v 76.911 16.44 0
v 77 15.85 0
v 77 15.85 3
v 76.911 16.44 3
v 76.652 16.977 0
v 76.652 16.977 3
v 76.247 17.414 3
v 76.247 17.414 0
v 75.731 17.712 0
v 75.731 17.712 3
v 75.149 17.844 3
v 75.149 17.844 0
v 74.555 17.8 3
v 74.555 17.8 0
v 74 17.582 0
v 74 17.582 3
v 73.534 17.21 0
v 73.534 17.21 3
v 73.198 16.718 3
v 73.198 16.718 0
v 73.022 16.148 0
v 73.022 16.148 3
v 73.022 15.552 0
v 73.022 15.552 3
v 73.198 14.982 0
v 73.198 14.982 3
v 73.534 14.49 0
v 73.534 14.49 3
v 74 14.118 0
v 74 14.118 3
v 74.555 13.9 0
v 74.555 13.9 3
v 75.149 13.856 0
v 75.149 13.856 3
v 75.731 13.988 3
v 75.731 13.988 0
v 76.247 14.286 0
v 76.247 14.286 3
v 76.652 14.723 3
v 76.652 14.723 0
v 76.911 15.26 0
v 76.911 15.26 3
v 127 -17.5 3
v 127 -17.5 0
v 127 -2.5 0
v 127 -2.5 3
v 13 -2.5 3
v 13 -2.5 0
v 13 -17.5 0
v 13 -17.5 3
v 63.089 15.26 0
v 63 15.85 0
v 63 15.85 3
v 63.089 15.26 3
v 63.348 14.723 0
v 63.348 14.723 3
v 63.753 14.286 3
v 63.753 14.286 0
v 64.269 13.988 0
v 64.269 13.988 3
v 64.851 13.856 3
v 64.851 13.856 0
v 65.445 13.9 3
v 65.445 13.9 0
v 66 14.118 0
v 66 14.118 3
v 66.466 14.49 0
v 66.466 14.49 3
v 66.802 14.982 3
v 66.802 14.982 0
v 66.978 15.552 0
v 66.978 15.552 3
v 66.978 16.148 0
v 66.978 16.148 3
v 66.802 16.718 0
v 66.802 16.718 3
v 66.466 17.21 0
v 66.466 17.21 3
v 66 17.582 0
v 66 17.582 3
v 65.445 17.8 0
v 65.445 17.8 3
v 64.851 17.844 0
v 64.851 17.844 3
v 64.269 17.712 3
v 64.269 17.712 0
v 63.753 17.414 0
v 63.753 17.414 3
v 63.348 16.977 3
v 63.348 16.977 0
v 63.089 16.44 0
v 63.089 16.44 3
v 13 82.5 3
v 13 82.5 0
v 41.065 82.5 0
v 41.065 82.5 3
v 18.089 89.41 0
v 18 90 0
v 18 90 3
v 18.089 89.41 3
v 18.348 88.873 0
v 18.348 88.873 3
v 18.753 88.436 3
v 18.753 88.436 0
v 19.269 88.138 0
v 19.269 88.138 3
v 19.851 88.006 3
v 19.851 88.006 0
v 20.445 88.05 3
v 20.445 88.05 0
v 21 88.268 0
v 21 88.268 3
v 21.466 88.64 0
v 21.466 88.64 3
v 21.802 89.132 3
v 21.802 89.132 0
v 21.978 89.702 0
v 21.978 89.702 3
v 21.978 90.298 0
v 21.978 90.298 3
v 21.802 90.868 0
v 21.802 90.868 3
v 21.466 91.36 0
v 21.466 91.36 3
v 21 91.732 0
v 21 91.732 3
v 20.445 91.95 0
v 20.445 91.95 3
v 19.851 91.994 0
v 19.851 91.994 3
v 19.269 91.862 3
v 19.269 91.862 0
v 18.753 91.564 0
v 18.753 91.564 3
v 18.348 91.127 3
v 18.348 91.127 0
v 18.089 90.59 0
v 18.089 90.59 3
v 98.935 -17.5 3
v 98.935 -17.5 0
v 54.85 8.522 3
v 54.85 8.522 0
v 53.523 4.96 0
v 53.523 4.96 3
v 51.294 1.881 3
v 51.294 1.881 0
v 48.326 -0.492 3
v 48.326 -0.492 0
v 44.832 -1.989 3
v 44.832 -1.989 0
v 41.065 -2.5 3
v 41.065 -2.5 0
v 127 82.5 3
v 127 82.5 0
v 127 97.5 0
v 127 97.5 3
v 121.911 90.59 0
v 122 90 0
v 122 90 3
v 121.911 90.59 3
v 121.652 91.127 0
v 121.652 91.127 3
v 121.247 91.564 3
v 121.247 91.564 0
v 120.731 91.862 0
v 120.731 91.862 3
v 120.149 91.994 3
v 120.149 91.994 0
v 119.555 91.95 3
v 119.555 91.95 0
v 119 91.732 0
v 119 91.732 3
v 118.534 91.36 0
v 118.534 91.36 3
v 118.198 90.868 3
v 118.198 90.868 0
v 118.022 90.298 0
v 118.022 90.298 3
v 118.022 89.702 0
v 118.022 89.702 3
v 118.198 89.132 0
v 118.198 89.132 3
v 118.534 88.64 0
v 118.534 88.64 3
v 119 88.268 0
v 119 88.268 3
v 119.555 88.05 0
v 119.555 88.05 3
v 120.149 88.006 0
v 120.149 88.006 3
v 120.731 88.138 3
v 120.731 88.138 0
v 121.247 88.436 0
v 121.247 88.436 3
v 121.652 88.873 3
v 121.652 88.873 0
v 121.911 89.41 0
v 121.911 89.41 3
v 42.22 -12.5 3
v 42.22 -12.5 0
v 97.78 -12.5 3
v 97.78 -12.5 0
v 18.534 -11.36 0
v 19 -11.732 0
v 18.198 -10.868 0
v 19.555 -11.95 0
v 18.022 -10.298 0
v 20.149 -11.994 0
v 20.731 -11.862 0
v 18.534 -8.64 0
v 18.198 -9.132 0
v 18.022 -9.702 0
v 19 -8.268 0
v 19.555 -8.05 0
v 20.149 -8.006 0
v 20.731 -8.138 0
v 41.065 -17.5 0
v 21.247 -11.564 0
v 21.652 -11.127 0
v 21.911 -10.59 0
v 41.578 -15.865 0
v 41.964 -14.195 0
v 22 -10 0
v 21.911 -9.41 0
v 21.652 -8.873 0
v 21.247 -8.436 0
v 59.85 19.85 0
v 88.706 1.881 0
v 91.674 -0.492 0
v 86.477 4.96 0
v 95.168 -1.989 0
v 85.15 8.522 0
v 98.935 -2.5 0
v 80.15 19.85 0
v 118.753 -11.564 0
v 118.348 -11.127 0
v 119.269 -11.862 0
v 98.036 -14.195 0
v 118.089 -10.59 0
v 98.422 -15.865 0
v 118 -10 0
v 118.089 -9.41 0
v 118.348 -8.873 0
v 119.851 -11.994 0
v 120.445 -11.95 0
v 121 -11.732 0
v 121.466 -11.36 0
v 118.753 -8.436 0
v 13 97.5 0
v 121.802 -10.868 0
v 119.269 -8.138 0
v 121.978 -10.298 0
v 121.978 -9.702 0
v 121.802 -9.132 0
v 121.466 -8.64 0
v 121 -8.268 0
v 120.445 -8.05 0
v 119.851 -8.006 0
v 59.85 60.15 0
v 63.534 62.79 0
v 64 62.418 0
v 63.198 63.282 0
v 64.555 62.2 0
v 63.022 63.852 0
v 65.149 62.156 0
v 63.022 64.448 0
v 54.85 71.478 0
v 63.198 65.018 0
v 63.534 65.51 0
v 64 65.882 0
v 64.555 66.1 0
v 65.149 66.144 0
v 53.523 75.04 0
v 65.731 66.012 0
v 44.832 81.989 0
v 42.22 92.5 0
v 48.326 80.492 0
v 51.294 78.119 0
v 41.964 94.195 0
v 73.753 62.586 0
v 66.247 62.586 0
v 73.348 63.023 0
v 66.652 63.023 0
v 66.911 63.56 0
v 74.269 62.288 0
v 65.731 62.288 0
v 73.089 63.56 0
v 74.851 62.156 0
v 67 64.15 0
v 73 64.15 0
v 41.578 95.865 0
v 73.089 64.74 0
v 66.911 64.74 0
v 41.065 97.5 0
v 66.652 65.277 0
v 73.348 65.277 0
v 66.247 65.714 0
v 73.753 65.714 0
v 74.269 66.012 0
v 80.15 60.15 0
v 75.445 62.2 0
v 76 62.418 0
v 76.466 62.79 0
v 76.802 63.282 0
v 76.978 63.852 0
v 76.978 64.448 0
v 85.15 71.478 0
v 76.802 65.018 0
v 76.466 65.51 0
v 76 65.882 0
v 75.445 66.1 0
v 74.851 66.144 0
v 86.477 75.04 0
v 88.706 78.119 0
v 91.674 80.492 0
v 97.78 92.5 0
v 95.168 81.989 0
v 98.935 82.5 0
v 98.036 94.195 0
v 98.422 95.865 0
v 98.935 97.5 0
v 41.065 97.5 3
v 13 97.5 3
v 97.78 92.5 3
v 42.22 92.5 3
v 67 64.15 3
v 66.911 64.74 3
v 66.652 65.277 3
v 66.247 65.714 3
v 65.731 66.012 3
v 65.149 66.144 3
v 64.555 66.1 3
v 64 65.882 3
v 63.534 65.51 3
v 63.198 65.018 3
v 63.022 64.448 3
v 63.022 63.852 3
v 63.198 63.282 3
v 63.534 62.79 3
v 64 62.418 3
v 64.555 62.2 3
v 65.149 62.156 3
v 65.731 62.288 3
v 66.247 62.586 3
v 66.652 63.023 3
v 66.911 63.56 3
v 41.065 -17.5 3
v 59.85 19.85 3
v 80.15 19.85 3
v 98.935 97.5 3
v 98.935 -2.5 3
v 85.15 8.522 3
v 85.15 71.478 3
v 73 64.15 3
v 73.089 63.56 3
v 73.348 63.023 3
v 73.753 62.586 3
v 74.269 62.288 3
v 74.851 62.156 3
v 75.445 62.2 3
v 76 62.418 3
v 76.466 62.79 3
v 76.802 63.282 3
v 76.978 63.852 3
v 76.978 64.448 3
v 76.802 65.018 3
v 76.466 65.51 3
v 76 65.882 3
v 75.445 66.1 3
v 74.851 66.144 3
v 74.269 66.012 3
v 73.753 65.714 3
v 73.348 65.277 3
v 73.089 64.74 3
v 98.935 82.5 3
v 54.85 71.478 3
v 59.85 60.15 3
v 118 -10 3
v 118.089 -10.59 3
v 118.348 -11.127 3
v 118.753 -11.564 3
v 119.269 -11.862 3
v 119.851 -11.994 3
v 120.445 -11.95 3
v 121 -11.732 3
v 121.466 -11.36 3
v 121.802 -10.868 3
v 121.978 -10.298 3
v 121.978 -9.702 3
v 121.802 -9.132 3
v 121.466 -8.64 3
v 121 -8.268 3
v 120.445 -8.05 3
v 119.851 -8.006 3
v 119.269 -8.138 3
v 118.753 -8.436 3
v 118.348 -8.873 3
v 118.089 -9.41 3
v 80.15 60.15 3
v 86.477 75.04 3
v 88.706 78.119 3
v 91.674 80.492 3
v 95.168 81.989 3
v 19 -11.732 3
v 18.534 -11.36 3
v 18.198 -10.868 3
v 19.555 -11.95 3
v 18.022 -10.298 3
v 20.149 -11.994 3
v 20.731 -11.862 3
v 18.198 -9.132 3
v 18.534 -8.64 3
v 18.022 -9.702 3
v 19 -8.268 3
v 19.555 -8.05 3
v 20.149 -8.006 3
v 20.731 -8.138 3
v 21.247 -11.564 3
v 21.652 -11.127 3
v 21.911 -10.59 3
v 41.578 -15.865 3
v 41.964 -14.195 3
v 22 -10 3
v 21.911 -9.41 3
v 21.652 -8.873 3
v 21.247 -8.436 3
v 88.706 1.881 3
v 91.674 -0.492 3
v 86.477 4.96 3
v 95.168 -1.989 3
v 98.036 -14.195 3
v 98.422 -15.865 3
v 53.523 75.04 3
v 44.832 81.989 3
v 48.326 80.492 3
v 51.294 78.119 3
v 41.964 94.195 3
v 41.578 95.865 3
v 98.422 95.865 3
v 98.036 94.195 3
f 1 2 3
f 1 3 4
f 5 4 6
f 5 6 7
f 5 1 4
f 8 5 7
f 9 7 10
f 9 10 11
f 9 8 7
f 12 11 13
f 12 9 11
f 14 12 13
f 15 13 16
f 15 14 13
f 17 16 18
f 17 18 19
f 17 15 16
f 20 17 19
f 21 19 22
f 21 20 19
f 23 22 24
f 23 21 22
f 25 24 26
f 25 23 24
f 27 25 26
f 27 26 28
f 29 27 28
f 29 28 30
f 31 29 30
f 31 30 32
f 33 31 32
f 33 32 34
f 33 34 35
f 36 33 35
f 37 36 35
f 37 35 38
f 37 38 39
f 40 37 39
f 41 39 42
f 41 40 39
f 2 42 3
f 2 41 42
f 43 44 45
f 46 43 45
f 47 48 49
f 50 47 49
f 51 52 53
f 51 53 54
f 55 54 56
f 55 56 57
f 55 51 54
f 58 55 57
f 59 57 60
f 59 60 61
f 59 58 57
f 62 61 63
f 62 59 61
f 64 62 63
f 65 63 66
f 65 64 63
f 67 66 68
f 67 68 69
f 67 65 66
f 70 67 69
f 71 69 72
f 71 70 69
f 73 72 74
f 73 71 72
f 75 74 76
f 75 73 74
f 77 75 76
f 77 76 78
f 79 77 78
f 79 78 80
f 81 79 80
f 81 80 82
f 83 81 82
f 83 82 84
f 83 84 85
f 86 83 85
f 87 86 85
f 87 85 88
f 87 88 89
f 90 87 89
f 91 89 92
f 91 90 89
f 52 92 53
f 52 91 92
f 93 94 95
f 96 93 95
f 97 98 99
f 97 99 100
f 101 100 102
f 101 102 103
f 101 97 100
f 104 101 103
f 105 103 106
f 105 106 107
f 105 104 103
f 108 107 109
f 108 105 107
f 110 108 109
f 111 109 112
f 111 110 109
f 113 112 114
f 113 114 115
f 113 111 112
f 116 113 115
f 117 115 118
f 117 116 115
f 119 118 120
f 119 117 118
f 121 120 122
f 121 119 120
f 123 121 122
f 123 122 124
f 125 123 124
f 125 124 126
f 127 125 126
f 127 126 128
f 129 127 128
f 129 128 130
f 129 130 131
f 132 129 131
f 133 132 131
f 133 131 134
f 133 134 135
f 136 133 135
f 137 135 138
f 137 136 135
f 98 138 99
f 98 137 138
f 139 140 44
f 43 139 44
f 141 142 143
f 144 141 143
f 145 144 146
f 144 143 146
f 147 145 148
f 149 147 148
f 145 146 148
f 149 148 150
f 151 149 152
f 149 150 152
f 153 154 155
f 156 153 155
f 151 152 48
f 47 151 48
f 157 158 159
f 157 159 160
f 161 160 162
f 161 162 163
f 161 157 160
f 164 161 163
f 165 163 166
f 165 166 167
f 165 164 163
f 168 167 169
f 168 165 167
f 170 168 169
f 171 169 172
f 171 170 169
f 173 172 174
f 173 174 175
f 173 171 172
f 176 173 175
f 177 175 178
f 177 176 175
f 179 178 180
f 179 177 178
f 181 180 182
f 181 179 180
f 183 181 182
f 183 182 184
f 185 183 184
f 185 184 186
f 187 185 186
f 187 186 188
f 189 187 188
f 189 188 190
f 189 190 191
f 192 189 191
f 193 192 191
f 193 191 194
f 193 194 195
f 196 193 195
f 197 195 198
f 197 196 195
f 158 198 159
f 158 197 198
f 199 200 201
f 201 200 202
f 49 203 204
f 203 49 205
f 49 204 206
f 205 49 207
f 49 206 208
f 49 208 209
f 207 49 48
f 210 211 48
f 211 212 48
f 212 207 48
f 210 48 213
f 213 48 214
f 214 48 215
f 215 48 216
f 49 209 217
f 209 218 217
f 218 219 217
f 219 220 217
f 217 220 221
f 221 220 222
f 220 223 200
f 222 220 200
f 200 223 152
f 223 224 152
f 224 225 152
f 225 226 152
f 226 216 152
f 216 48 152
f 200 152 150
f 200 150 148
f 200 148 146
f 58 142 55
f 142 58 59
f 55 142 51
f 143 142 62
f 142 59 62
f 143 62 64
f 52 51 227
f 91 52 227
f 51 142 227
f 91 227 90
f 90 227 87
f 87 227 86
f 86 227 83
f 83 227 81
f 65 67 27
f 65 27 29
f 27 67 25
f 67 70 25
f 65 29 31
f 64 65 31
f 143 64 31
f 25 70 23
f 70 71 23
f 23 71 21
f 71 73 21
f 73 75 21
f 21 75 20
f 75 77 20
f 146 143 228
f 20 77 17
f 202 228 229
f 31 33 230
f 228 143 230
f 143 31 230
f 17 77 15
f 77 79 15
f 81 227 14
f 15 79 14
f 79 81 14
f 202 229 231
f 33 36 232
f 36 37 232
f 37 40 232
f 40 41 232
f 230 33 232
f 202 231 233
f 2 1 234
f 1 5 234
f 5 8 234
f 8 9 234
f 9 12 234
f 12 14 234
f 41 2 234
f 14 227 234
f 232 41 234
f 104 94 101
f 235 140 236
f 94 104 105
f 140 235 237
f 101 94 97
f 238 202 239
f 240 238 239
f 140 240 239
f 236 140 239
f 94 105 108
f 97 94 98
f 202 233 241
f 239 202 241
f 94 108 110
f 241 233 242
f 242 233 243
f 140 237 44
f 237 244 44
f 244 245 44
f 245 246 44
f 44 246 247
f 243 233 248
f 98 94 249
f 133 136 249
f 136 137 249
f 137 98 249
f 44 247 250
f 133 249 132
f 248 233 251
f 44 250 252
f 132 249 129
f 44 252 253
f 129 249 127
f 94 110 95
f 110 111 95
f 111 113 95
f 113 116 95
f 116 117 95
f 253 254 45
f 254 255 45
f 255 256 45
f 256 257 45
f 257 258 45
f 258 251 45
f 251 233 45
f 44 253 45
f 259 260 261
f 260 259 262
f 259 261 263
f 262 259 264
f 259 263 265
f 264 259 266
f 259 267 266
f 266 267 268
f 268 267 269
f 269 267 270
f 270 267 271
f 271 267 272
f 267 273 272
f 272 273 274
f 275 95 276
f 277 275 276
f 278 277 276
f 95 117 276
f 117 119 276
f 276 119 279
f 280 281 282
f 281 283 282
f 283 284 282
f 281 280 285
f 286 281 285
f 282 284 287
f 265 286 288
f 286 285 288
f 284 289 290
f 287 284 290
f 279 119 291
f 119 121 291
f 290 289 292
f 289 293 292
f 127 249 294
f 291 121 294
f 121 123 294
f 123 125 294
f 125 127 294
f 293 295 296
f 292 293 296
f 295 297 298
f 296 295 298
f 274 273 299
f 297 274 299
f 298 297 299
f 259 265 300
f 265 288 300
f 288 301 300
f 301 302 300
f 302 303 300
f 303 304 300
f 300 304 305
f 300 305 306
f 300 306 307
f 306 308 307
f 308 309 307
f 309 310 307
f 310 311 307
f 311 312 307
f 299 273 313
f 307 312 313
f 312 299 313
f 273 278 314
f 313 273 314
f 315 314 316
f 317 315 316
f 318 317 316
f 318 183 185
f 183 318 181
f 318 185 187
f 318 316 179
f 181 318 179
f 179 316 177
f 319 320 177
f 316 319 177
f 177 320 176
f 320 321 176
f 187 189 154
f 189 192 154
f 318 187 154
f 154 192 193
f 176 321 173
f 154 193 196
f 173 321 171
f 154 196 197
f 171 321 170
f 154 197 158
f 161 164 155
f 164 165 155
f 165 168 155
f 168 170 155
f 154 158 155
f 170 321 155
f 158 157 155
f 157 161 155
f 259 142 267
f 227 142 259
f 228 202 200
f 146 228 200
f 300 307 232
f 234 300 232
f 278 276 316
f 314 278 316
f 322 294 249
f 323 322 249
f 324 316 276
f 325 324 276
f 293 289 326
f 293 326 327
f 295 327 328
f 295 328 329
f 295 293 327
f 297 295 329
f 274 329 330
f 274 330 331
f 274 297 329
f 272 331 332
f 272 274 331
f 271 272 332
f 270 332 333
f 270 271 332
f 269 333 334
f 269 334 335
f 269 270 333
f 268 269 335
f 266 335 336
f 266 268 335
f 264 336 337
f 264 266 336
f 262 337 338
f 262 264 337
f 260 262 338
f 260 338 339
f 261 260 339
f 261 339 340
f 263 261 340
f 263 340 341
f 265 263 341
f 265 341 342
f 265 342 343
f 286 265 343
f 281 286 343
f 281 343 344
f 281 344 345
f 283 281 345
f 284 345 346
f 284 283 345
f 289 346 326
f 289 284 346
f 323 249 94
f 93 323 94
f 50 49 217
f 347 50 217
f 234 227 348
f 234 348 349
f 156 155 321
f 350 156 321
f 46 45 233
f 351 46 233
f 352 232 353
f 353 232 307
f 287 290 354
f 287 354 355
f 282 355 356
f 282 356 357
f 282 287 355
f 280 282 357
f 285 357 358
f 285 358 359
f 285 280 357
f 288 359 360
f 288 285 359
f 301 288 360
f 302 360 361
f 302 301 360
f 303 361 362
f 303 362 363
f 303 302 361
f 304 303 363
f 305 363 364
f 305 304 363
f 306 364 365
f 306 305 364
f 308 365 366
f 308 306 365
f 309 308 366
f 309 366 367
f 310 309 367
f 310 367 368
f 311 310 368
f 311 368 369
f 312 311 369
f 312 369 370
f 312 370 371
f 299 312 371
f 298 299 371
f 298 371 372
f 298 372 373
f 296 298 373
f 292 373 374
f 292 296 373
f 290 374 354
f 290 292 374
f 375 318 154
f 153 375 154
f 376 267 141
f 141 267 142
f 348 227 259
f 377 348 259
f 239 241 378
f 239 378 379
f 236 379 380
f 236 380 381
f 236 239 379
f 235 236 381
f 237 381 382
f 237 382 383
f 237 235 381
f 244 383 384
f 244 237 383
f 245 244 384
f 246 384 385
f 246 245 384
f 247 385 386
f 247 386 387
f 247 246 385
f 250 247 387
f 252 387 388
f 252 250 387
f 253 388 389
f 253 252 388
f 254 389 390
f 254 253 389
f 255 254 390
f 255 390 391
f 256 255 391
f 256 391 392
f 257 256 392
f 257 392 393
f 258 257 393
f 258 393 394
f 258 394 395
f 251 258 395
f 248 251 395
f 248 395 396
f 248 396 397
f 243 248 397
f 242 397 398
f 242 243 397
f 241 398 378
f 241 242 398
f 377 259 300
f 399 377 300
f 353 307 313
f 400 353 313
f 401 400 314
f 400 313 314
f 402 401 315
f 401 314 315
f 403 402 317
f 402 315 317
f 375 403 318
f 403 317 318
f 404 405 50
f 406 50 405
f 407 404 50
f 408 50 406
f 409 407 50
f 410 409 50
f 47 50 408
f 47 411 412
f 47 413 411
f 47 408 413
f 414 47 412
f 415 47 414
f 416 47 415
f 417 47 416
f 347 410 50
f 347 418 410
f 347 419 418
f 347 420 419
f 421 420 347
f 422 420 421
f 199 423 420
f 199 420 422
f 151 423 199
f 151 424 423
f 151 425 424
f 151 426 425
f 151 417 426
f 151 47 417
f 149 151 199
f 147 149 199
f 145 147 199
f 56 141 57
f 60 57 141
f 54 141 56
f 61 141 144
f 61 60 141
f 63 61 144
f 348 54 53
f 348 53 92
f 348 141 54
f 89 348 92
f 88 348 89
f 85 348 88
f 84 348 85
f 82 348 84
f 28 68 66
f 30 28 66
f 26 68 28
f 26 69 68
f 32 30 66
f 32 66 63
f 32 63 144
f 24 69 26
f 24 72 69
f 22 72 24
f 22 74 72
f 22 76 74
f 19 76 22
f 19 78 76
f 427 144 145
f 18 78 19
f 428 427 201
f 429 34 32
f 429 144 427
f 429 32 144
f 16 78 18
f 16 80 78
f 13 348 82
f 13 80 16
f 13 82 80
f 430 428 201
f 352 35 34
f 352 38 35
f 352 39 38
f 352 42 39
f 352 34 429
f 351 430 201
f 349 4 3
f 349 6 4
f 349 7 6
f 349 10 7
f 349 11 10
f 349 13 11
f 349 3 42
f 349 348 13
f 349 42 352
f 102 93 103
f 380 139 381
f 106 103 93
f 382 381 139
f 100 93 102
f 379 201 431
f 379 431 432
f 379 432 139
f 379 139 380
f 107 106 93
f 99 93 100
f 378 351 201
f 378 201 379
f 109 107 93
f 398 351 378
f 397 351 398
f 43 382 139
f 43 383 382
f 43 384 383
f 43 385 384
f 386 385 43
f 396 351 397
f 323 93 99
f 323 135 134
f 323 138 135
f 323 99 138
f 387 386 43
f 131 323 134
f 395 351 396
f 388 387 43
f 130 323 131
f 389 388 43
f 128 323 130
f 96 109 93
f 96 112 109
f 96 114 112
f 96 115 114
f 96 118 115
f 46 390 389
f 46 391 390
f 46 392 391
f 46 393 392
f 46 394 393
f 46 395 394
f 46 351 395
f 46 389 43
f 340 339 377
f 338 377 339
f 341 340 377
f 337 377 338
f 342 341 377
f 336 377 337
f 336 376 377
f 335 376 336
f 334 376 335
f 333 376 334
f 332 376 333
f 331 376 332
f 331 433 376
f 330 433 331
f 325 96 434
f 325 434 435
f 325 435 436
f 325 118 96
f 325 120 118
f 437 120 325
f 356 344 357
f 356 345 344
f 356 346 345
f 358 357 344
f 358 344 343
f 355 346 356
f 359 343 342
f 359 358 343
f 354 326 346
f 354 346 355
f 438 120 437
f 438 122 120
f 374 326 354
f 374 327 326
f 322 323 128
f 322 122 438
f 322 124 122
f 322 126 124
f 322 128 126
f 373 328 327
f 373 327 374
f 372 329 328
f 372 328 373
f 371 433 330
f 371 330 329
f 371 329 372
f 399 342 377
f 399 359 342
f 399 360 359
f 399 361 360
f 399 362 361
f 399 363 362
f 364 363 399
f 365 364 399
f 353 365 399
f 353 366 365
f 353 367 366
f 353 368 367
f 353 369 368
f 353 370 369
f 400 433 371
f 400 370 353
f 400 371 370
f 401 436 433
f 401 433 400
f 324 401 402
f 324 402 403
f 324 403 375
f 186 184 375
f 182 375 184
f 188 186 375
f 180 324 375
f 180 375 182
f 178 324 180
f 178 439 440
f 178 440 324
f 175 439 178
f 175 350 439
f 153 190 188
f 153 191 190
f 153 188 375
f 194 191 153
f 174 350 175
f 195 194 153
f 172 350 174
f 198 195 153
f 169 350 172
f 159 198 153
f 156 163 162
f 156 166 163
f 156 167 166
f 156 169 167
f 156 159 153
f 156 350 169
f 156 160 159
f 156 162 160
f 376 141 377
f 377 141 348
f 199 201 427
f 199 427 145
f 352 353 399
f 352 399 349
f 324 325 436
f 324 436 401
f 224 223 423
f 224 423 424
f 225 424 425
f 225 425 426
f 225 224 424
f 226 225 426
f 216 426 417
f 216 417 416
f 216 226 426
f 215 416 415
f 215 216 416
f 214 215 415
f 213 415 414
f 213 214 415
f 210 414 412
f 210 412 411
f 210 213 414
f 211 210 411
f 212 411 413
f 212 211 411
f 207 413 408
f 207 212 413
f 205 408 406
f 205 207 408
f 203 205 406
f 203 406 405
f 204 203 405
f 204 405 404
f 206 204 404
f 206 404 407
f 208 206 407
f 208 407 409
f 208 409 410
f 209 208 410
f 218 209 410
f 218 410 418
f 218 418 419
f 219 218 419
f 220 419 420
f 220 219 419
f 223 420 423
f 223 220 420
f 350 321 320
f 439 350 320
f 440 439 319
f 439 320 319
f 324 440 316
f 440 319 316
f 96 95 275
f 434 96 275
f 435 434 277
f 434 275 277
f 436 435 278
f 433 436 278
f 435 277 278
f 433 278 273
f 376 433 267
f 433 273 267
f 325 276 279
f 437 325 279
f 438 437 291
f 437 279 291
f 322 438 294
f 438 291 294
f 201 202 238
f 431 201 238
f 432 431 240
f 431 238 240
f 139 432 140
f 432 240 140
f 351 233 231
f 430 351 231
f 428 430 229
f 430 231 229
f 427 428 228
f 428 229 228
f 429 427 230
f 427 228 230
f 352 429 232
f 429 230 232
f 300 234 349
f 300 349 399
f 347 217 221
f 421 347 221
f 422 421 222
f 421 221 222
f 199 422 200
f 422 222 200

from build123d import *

# Parameters (mm, degrees)
CROQUIS2_R              = 2
CROQUIS2_W              = 20.3
CROQUIS2_H              = 40.3
SALIENTE_EXTRUIR2_DEPTH = 3


with BuildPart() as part:
    # Croquis2 → Saliente-Extruir2 (new body)
    with BuildSketch(Plane.XY):
        with BuildLine():
            Line((54.85, 71.478027684), (54.85, 8.521972316))
            ThreePointArc((54.85, 8.521972316), (49.890052554, 0.594274169), (41.065374433, -2.5))
            Line((41.065374433, -2.5), (13, -2.5))
            Line((13, -2.5), (13, -17.5))
            Line((13, -17.5), (41.065374433, -17.5))
            ThreePointArc((41.065374433, -17.5), (41.786840737, -15.033246538), (42.220486043, -12.5))
            Line((42.220486043, -12.5), (67.5, -12.5))
            Line((67.5, -12.5), (72.5, -12.5))
            Line((72.5, -12.5), (97.779513957, -12.5))
            ThreePointArc((97.779513957, -12.5), (98.213159263, -15.033246538), (98.934625567, -17.5))
            Line((98.934625567, -17.5), (127, -17.5))
            Line((127, -17.5), (127, -2.5))
            Line((127, -2.5), (98.934625567, -2.5))
            ThreePointArc((98.934625567, -2.5), (90.109947446, 0.594274169), (85.15, 8.521972316))
            Line((85.15, 8.521972316), (85.15, 71.478027684))
            ThreePointArc((85.15, 71.478027684), (90.109947446, 79.405725831), (98.934625567, 82.5))
            Line((98.934625567, 82.5), (127, 82.5))
            Line((127, 82.5), (127, 97.5))
            Line((127, 97.5), (98.934625567, 97.5))
            ThreePointArc((98.934625567, 97.5), (98.213159263, 95.033246538), (97.779513957, 92.5))
            Line((97.779513957, 92.5), (72.5, 92.5))
            Line((72.5, 92.5), (67.5, 92.5))
            Line((67.5, 92.5), (42.220486043, 92.5))
            ThreePointArc((42.220486043, 92.5), (41.786840737, 95.033246538), (41.065374433, 97.5))
            Line((41.065374433, 97.5), (13, 97.5))
            Line((13, 97.5), (13, 82.5))
            Line((13, 82.5), (41.065374433, 82.5))
            ThreePointArc((41.065374433, 82.5), (49.890052554, 79.405725831), (54.85, 71.478027684))
        make_face()
        with Locations((65, 64.15)):
            Circle(CROQUIS2_R, mode=Mode.SUBTRACT)
        with Locations(Location((75, 64.15, 0), (0, 0, 180))):
            Circle(CROQUIS2_R, mode=Mode.SUBTRACT)
        with Locations((75, 15.85)):
            Circle(CROQUIS2_R, mode=Mode.SUBTRACT)
        with Locations(Location((65, 15.85, 0), (0, 0, 180))):
            Circle(CROQUIS2_R, mode=Mode.SUBTRACT)
        with Locations((20, -10)):
            Circle(CROQUIS2_R, mode=Mode.SUBTRACT)
        with Locations(Location((120, -10, 0), (0, 0, 180))):
            Circle(CROQUIS2_R, mode=Mode.SUBTRACT)
        with Locations((120, 90)):
            Circle(CROQUIS2_R, mode=Mode.SUBTRACT)
        with Locations(Location((20, 90, 0), (0, 0, 180))):
            Circle(CROQUIS2_R, mode=Mode.SUBTRACT)
        with Locations((70, 40)):
            Rectangle(CROQUIS2_W, CROQUIS2_H, mode=Mode.SUBTRACT)
    extrude(amount=SALIENTE_EXTRUIR2_DEPTH)


solid = part.part
